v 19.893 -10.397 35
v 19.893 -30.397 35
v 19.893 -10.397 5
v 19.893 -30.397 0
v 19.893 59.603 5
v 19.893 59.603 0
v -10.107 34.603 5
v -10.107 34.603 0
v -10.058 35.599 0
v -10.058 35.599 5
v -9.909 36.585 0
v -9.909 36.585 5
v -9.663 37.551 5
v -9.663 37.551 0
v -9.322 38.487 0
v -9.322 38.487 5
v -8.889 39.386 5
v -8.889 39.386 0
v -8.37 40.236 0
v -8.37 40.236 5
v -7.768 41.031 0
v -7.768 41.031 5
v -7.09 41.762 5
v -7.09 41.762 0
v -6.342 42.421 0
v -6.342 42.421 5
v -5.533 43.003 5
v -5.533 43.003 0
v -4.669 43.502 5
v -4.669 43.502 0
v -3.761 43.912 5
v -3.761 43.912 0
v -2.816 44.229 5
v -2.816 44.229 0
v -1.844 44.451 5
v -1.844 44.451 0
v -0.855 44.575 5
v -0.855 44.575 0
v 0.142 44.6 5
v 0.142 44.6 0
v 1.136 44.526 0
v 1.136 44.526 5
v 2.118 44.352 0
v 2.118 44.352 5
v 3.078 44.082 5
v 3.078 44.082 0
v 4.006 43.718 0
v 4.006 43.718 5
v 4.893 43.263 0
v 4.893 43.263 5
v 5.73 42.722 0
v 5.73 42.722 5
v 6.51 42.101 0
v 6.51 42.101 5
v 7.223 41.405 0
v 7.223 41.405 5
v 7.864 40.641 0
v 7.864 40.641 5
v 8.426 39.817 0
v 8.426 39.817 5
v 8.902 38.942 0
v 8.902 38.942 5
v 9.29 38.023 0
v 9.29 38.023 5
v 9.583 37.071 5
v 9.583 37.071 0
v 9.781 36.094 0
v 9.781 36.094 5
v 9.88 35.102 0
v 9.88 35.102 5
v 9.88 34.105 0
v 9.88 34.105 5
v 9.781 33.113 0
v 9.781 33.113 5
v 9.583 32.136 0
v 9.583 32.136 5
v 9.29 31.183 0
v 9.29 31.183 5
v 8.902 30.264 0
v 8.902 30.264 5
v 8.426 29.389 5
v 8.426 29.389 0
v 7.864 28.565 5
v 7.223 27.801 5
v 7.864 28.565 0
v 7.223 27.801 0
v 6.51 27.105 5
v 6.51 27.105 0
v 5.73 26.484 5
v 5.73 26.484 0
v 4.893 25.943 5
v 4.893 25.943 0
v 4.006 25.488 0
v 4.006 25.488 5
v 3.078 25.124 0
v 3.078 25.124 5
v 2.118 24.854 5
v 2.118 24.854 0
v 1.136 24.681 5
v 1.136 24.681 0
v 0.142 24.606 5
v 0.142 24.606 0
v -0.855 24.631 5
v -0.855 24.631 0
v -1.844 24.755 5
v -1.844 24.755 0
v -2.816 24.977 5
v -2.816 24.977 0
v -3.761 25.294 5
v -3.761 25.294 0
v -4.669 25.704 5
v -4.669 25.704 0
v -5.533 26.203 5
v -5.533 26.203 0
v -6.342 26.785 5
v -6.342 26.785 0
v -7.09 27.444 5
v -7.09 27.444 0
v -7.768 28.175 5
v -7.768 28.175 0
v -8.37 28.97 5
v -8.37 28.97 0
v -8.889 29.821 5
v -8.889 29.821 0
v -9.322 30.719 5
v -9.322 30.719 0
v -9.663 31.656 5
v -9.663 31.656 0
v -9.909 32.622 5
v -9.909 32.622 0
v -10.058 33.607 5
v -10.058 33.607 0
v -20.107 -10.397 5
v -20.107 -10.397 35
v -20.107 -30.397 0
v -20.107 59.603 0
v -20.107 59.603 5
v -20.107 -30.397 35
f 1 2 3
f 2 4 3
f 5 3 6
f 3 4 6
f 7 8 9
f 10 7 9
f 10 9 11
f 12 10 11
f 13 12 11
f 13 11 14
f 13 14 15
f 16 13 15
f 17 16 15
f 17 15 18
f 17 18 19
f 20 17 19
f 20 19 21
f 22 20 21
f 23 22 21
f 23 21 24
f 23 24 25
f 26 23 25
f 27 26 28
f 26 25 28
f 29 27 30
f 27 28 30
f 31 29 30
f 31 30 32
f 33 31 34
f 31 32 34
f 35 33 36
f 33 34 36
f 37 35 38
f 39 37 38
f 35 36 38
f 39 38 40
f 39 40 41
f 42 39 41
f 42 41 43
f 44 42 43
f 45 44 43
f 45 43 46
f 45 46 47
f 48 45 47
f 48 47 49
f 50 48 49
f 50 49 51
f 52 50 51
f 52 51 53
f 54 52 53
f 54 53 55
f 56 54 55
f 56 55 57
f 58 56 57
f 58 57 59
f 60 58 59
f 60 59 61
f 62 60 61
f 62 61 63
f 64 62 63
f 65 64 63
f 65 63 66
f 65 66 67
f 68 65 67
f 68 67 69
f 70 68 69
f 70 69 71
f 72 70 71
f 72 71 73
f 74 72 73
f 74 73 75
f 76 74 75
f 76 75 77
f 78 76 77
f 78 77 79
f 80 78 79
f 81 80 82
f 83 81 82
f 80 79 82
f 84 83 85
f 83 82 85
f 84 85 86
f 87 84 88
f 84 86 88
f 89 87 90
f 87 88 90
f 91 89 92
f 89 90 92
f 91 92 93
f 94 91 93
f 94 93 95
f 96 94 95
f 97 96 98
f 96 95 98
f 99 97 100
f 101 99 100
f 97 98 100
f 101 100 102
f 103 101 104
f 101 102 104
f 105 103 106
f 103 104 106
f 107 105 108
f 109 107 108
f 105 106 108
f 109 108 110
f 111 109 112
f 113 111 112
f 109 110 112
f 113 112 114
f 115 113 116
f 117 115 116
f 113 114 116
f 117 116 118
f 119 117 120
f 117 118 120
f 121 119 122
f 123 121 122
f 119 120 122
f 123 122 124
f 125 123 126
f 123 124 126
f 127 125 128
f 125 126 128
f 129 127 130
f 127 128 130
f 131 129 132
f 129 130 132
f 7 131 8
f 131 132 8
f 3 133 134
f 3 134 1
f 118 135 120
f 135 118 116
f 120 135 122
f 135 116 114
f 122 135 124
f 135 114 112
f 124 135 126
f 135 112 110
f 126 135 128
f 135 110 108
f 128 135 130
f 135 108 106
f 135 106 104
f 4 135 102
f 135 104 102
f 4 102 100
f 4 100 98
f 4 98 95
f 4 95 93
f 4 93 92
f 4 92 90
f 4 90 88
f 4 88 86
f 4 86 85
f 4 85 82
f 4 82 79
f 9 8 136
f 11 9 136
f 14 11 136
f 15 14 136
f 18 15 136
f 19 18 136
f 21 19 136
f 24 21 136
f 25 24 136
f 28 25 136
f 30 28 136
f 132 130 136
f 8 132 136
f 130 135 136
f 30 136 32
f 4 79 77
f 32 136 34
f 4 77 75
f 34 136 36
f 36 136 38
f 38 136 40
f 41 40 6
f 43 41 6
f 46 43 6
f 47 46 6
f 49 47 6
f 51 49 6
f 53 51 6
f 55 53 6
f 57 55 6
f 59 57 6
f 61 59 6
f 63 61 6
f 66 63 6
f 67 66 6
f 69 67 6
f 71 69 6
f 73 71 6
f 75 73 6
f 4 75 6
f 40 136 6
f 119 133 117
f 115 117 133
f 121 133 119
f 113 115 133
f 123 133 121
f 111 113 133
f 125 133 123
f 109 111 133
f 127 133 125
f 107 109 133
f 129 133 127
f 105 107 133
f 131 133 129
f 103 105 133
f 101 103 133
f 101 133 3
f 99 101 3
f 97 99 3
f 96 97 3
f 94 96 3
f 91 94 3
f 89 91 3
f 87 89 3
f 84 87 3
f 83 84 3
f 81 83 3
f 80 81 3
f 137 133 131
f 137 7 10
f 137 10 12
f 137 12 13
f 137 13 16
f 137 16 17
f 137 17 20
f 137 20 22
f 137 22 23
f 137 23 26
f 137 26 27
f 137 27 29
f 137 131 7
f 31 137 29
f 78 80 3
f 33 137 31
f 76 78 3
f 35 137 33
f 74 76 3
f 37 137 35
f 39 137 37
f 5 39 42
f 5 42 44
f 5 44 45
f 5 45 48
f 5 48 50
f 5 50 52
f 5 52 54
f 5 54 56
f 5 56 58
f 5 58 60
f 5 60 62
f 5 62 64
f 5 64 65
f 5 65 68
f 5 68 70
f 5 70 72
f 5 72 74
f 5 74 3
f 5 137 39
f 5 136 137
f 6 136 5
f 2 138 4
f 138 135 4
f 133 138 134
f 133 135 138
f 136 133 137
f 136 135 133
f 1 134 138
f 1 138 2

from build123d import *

# Parameters (mm, degrees)
SKETCH1_W           = 40
SKETCH1_H           = 90
BOSS_EXTRUDE1_DEPTH = 5
SKETCH2_W           = 40
SKETCH2_H           = 20
BOSS_EXTRUDE2_DEPTH = 30
SKETCH3_R           = 10
CUT_EXTRUDE1_DEPTH  = 30


with BuildPart() as part:
    # Sketch1 → Boss-Extrude1 (new body)
    with BuildSketch(Plane.XY):
        with Locations((-0.107274634, 14.603113743)):
            Rectangle(SKETCH1_W, SKETCH1_H)
    extrude(amount=BOSS_EXTRUDE1_DEPTH)

    # Sketch2 → Boss-Extrude2 (add)
    with BuildSketch(Plane.XY.offset(5)):
        with Locations((-0.107274634, -20.396886257)):
            Rectangle(SKETCH2_W, SKETCH2_H)
    extrude(amount=BOSS_EXTRUDE2_DEPTH)

    # Sketch3 → Cut-Extrude1 (cut)
    with BuildSketch(Plane(origin=(0, 0, 0), x_dir=(-1, 0, 0), z_dir=(0, 0, -1))):
        with Locations((0.107274634, 34.603113743)):
            Circle(SKETCH3_R)
    extrude(amount=-CUT_EXTRUDE1_DEPTH, mode=Mode.SUBTRACT)


solid = part.part
